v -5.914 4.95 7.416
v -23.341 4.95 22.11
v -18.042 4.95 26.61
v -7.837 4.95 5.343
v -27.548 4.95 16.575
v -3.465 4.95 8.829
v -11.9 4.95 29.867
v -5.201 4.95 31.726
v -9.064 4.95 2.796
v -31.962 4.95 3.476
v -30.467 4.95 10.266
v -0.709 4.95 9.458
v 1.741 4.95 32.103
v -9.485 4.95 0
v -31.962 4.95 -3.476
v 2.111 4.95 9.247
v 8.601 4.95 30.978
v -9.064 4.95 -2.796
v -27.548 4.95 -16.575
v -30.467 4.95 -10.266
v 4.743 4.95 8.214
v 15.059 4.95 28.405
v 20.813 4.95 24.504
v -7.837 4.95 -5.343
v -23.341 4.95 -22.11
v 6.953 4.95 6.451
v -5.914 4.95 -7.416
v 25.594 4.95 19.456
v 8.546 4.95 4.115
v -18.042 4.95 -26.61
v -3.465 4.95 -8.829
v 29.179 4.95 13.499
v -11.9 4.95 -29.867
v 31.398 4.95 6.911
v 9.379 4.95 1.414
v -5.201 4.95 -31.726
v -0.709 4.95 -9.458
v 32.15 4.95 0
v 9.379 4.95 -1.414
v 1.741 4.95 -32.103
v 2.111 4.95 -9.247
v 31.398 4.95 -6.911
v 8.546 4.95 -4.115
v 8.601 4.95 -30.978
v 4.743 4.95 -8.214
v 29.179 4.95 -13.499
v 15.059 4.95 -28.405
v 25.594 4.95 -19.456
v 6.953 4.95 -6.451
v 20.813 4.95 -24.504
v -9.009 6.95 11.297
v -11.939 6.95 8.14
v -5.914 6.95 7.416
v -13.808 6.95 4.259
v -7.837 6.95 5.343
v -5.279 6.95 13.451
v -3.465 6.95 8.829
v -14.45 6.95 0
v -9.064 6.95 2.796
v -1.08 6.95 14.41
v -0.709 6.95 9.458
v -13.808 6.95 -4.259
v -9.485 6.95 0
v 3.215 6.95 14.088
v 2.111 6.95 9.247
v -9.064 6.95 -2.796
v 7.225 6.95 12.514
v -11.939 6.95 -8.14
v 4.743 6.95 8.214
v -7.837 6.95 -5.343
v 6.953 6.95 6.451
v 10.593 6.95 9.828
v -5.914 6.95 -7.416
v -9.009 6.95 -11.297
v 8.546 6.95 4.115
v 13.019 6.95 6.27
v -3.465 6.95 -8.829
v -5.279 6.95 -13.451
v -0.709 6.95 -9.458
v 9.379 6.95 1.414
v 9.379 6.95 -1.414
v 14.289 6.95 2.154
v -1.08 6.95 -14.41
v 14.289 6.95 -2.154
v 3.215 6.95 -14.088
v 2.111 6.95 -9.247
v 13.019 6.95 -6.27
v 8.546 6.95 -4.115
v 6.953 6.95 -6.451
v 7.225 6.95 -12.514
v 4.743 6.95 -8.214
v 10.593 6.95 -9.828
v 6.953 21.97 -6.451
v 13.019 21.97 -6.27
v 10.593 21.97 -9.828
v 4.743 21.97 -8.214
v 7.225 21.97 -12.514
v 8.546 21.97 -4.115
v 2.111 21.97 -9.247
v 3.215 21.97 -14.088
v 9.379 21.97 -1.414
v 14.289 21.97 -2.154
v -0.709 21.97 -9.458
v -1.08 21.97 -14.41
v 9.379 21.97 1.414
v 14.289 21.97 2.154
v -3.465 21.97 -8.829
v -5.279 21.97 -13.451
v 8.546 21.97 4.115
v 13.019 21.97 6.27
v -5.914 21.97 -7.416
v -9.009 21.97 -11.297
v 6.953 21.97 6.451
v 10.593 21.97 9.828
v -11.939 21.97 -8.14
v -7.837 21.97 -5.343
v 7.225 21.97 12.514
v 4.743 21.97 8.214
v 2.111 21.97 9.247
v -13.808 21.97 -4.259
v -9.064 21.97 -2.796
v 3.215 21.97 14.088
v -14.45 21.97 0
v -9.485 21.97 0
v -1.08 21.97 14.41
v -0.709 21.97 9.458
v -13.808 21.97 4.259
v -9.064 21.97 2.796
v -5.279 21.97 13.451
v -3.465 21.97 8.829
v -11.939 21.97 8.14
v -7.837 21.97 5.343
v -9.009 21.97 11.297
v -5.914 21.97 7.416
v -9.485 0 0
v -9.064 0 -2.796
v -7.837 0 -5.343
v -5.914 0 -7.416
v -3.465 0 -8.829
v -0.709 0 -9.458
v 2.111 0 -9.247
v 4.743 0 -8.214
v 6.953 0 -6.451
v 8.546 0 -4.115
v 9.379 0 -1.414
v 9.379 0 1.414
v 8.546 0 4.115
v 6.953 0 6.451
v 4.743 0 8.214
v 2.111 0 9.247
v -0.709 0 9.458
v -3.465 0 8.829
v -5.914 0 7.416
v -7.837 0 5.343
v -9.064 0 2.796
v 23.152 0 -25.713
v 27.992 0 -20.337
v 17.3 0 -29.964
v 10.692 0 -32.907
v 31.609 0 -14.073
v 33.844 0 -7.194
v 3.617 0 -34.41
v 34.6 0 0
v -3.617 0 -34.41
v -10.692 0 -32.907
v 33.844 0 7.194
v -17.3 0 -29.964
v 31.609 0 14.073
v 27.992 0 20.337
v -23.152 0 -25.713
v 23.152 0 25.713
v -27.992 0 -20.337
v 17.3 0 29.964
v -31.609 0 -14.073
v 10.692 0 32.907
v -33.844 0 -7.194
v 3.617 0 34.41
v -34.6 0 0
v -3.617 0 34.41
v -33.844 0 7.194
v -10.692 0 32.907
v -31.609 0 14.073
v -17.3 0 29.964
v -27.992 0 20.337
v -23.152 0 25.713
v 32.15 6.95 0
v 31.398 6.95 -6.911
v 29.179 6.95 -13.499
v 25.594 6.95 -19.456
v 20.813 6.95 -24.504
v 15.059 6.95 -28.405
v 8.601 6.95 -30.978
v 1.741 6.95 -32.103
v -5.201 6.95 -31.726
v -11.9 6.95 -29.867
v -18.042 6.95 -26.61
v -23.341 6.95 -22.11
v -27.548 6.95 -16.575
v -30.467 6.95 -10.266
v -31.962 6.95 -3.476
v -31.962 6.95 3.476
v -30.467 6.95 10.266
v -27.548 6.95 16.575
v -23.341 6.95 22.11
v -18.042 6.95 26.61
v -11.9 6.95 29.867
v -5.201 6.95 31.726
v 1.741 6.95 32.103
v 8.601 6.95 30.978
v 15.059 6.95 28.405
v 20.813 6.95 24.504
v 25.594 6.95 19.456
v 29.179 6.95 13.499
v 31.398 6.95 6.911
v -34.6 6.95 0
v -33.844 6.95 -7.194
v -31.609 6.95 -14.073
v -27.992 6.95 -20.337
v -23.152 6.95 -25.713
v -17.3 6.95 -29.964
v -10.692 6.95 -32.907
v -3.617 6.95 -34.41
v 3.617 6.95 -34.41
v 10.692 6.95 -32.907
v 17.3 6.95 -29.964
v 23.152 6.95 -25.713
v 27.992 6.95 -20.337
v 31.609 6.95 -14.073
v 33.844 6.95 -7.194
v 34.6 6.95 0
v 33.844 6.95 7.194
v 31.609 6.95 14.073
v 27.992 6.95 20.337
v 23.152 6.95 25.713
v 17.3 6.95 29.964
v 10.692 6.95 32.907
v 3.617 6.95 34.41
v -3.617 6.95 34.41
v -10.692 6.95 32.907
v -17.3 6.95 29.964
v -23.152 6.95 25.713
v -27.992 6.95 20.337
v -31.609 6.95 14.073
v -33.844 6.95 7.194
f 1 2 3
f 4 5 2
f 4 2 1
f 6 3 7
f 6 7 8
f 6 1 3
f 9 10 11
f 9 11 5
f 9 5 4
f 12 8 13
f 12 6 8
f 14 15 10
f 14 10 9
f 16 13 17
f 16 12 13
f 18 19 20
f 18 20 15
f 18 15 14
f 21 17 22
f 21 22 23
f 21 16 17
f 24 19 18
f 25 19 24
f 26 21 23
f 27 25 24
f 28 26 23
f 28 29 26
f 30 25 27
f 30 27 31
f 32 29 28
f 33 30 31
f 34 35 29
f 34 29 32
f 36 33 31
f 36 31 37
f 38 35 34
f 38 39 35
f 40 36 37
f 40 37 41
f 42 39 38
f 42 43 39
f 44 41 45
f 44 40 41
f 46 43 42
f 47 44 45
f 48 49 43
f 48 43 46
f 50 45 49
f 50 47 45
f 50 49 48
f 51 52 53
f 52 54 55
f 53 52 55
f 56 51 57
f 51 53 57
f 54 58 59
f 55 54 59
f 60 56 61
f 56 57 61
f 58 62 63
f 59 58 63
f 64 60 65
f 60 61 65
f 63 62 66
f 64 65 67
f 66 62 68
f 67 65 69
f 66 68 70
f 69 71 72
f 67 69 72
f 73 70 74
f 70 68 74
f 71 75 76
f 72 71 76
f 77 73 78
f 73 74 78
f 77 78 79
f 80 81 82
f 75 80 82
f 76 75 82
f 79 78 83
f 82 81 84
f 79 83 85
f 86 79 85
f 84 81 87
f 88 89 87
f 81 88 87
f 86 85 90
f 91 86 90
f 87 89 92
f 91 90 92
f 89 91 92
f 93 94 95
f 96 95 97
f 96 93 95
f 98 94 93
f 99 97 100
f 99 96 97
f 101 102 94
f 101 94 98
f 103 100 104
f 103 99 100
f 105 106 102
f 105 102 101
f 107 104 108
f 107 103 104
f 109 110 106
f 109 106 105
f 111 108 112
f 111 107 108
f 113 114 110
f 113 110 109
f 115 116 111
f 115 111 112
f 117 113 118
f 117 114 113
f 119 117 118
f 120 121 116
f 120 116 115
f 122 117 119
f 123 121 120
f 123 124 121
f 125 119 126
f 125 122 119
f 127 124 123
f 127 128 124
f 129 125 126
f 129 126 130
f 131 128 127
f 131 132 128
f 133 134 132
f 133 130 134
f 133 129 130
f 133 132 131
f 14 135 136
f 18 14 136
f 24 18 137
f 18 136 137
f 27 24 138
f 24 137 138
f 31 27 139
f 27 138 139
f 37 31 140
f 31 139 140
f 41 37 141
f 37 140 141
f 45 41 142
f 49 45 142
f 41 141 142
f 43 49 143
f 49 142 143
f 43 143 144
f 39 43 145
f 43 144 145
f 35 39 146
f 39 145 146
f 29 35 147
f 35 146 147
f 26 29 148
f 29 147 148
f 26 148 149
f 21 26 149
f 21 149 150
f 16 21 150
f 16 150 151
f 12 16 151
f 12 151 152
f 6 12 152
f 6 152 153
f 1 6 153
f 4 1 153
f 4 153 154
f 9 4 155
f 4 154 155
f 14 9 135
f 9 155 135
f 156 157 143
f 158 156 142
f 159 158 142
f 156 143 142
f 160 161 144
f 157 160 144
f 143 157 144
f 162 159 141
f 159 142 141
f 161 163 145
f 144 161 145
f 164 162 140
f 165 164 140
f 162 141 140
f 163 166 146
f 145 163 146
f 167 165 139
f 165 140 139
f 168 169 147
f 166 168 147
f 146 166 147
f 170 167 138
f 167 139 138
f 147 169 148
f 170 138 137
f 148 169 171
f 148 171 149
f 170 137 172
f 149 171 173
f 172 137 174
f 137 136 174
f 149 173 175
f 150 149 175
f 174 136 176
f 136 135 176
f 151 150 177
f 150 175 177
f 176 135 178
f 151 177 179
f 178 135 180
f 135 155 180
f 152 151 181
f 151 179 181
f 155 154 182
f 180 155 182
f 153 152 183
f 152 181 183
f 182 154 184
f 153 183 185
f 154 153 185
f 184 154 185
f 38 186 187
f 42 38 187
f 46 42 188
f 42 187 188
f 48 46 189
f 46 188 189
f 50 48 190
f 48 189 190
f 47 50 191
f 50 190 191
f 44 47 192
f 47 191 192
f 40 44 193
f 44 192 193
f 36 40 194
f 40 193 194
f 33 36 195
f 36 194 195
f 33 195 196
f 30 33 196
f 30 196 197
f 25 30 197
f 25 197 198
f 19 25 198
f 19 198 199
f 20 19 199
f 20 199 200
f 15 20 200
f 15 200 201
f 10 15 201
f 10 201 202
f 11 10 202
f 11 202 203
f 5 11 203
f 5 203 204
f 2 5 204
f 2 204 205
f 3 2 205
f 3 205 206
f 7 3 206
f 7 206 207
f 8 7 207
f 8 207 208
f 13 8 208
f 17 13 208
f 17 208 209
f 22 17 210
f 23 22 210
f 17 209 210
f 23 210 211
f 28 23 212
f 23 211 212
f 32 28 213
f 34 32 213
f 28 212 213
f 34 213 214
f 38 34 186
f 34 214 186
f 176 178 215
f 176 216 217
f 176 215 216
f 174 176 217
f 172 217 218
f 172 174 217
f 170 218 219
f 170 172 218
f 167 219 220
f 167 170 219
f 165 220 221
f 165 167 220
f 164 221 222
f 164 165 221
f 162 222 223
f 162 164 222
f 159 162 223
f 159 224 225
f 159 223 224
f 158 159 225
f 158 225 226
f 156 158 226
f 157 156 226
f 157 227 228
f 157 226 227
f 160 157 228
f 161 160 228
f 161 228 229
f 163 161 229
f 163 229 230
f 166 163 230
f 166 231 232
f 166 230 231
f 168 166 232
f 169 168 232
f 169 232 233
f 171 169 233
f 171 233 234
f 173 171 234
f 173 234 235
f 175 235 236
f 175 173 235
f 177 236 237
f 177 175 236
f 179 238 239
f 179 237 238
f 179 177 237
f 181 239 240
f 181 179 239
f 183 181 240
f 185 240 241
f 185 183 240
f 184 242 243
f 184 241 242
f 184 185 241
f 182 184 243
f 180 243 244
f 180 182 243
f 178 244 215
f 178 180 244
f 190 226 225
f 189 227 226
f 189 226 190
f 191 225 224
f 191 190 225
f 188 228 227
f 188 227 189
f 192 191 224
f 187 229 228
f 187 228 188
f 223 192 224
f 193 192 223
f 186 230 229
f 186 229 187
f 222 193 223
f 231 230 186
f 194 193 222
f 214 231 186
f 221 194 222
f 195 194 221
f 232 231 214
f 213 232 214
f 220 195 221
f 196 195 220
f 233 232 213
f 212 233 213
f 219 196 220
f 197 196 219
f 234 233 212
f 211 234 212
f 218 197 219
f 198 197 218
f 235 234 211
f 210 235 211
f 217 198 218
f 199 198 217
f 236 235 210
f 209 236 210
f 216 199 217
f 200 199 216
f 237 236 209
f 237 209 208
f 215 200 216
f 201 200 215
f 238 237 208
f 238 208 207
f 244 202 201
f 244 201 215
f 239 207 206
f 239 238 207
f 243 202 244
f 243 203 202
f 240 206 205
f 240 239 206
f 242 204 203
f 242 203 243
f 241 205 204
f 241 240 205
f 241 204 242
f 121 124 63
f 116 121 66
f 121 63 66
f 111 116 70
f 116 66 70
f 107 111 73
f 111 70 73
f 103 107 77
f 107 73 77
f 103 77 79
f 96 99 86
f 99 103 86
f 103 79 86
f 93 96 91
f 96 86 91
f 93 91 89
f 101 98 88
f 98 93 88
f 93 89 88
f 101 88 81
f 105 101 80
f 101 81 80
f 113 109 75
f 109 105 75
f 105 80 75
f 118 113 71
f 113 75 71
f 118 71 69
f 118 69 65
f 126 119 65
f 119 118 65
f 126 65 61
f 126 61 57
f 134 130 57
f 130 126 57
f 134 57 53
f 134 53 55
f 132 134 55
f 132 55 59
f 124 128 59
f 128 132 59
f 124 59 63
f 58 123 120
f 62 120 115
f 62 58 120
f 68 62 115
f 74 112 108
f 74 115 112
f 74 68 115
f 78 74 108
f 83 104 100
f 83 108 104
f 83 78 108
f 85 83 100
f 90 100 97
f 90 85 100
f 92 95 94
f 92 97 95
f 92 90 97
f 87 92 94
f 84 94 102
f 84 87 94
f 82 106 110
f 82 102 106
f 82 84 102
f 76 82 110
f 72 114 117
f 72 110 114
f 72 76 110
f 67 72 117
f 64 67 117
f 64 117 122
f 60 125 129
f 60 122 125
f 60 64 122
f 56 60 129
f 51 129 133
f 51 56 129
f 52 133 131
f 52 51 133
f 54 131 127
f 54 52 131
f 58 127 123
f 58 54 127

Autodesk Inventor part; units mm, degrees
ref_plane "YZ Plane" through (0, 0, 0) normal (1, 0, 0) x (0, 1, 0)
ref_plane "XZ Plane" through (0, 0, 0) normal (0, 1, 0) x (-1, 0, 0)
ref_plane "XY Plane" through (0, 0, 0) normal (0, 0, 1) x (1, 0, 0)
sketch "Boceto1" plane through (0, 0, 0) normal (0, 1, 0) x (-1, 0, 0)
  circle A0 centre (0, 0) radius 34.6
  circle A1 centre (0, 0) radius 9.485
  circle A2 centre (0, 0) radius 14.45
  dimension "d0" = 69.2
  dimension "d1" = 18.97
  dimension "d2" = 28.9
extrude "Extrusión1" add sketch "Boceto1" along normal blind 21.97 contours A2
extrude "Extrusión2" add sketch "Boceto1" along normal blind 6.95 contours A0
thread "Rosca1" size "M20x2.5" class "6H" standard "ANSI Metric M Profile" full length
sketch "Boceto2" plane through (0, 6.95, 0) normal (0, 1, 0) x (1, 0, 0)
  circle A0 centre (0, 0) radius 32.15
  dimension "d9" = 64.3
extrude "Extrusión3" cut sketch "Boceto2" against normal blind 2
properties part number "FLANCHE"
